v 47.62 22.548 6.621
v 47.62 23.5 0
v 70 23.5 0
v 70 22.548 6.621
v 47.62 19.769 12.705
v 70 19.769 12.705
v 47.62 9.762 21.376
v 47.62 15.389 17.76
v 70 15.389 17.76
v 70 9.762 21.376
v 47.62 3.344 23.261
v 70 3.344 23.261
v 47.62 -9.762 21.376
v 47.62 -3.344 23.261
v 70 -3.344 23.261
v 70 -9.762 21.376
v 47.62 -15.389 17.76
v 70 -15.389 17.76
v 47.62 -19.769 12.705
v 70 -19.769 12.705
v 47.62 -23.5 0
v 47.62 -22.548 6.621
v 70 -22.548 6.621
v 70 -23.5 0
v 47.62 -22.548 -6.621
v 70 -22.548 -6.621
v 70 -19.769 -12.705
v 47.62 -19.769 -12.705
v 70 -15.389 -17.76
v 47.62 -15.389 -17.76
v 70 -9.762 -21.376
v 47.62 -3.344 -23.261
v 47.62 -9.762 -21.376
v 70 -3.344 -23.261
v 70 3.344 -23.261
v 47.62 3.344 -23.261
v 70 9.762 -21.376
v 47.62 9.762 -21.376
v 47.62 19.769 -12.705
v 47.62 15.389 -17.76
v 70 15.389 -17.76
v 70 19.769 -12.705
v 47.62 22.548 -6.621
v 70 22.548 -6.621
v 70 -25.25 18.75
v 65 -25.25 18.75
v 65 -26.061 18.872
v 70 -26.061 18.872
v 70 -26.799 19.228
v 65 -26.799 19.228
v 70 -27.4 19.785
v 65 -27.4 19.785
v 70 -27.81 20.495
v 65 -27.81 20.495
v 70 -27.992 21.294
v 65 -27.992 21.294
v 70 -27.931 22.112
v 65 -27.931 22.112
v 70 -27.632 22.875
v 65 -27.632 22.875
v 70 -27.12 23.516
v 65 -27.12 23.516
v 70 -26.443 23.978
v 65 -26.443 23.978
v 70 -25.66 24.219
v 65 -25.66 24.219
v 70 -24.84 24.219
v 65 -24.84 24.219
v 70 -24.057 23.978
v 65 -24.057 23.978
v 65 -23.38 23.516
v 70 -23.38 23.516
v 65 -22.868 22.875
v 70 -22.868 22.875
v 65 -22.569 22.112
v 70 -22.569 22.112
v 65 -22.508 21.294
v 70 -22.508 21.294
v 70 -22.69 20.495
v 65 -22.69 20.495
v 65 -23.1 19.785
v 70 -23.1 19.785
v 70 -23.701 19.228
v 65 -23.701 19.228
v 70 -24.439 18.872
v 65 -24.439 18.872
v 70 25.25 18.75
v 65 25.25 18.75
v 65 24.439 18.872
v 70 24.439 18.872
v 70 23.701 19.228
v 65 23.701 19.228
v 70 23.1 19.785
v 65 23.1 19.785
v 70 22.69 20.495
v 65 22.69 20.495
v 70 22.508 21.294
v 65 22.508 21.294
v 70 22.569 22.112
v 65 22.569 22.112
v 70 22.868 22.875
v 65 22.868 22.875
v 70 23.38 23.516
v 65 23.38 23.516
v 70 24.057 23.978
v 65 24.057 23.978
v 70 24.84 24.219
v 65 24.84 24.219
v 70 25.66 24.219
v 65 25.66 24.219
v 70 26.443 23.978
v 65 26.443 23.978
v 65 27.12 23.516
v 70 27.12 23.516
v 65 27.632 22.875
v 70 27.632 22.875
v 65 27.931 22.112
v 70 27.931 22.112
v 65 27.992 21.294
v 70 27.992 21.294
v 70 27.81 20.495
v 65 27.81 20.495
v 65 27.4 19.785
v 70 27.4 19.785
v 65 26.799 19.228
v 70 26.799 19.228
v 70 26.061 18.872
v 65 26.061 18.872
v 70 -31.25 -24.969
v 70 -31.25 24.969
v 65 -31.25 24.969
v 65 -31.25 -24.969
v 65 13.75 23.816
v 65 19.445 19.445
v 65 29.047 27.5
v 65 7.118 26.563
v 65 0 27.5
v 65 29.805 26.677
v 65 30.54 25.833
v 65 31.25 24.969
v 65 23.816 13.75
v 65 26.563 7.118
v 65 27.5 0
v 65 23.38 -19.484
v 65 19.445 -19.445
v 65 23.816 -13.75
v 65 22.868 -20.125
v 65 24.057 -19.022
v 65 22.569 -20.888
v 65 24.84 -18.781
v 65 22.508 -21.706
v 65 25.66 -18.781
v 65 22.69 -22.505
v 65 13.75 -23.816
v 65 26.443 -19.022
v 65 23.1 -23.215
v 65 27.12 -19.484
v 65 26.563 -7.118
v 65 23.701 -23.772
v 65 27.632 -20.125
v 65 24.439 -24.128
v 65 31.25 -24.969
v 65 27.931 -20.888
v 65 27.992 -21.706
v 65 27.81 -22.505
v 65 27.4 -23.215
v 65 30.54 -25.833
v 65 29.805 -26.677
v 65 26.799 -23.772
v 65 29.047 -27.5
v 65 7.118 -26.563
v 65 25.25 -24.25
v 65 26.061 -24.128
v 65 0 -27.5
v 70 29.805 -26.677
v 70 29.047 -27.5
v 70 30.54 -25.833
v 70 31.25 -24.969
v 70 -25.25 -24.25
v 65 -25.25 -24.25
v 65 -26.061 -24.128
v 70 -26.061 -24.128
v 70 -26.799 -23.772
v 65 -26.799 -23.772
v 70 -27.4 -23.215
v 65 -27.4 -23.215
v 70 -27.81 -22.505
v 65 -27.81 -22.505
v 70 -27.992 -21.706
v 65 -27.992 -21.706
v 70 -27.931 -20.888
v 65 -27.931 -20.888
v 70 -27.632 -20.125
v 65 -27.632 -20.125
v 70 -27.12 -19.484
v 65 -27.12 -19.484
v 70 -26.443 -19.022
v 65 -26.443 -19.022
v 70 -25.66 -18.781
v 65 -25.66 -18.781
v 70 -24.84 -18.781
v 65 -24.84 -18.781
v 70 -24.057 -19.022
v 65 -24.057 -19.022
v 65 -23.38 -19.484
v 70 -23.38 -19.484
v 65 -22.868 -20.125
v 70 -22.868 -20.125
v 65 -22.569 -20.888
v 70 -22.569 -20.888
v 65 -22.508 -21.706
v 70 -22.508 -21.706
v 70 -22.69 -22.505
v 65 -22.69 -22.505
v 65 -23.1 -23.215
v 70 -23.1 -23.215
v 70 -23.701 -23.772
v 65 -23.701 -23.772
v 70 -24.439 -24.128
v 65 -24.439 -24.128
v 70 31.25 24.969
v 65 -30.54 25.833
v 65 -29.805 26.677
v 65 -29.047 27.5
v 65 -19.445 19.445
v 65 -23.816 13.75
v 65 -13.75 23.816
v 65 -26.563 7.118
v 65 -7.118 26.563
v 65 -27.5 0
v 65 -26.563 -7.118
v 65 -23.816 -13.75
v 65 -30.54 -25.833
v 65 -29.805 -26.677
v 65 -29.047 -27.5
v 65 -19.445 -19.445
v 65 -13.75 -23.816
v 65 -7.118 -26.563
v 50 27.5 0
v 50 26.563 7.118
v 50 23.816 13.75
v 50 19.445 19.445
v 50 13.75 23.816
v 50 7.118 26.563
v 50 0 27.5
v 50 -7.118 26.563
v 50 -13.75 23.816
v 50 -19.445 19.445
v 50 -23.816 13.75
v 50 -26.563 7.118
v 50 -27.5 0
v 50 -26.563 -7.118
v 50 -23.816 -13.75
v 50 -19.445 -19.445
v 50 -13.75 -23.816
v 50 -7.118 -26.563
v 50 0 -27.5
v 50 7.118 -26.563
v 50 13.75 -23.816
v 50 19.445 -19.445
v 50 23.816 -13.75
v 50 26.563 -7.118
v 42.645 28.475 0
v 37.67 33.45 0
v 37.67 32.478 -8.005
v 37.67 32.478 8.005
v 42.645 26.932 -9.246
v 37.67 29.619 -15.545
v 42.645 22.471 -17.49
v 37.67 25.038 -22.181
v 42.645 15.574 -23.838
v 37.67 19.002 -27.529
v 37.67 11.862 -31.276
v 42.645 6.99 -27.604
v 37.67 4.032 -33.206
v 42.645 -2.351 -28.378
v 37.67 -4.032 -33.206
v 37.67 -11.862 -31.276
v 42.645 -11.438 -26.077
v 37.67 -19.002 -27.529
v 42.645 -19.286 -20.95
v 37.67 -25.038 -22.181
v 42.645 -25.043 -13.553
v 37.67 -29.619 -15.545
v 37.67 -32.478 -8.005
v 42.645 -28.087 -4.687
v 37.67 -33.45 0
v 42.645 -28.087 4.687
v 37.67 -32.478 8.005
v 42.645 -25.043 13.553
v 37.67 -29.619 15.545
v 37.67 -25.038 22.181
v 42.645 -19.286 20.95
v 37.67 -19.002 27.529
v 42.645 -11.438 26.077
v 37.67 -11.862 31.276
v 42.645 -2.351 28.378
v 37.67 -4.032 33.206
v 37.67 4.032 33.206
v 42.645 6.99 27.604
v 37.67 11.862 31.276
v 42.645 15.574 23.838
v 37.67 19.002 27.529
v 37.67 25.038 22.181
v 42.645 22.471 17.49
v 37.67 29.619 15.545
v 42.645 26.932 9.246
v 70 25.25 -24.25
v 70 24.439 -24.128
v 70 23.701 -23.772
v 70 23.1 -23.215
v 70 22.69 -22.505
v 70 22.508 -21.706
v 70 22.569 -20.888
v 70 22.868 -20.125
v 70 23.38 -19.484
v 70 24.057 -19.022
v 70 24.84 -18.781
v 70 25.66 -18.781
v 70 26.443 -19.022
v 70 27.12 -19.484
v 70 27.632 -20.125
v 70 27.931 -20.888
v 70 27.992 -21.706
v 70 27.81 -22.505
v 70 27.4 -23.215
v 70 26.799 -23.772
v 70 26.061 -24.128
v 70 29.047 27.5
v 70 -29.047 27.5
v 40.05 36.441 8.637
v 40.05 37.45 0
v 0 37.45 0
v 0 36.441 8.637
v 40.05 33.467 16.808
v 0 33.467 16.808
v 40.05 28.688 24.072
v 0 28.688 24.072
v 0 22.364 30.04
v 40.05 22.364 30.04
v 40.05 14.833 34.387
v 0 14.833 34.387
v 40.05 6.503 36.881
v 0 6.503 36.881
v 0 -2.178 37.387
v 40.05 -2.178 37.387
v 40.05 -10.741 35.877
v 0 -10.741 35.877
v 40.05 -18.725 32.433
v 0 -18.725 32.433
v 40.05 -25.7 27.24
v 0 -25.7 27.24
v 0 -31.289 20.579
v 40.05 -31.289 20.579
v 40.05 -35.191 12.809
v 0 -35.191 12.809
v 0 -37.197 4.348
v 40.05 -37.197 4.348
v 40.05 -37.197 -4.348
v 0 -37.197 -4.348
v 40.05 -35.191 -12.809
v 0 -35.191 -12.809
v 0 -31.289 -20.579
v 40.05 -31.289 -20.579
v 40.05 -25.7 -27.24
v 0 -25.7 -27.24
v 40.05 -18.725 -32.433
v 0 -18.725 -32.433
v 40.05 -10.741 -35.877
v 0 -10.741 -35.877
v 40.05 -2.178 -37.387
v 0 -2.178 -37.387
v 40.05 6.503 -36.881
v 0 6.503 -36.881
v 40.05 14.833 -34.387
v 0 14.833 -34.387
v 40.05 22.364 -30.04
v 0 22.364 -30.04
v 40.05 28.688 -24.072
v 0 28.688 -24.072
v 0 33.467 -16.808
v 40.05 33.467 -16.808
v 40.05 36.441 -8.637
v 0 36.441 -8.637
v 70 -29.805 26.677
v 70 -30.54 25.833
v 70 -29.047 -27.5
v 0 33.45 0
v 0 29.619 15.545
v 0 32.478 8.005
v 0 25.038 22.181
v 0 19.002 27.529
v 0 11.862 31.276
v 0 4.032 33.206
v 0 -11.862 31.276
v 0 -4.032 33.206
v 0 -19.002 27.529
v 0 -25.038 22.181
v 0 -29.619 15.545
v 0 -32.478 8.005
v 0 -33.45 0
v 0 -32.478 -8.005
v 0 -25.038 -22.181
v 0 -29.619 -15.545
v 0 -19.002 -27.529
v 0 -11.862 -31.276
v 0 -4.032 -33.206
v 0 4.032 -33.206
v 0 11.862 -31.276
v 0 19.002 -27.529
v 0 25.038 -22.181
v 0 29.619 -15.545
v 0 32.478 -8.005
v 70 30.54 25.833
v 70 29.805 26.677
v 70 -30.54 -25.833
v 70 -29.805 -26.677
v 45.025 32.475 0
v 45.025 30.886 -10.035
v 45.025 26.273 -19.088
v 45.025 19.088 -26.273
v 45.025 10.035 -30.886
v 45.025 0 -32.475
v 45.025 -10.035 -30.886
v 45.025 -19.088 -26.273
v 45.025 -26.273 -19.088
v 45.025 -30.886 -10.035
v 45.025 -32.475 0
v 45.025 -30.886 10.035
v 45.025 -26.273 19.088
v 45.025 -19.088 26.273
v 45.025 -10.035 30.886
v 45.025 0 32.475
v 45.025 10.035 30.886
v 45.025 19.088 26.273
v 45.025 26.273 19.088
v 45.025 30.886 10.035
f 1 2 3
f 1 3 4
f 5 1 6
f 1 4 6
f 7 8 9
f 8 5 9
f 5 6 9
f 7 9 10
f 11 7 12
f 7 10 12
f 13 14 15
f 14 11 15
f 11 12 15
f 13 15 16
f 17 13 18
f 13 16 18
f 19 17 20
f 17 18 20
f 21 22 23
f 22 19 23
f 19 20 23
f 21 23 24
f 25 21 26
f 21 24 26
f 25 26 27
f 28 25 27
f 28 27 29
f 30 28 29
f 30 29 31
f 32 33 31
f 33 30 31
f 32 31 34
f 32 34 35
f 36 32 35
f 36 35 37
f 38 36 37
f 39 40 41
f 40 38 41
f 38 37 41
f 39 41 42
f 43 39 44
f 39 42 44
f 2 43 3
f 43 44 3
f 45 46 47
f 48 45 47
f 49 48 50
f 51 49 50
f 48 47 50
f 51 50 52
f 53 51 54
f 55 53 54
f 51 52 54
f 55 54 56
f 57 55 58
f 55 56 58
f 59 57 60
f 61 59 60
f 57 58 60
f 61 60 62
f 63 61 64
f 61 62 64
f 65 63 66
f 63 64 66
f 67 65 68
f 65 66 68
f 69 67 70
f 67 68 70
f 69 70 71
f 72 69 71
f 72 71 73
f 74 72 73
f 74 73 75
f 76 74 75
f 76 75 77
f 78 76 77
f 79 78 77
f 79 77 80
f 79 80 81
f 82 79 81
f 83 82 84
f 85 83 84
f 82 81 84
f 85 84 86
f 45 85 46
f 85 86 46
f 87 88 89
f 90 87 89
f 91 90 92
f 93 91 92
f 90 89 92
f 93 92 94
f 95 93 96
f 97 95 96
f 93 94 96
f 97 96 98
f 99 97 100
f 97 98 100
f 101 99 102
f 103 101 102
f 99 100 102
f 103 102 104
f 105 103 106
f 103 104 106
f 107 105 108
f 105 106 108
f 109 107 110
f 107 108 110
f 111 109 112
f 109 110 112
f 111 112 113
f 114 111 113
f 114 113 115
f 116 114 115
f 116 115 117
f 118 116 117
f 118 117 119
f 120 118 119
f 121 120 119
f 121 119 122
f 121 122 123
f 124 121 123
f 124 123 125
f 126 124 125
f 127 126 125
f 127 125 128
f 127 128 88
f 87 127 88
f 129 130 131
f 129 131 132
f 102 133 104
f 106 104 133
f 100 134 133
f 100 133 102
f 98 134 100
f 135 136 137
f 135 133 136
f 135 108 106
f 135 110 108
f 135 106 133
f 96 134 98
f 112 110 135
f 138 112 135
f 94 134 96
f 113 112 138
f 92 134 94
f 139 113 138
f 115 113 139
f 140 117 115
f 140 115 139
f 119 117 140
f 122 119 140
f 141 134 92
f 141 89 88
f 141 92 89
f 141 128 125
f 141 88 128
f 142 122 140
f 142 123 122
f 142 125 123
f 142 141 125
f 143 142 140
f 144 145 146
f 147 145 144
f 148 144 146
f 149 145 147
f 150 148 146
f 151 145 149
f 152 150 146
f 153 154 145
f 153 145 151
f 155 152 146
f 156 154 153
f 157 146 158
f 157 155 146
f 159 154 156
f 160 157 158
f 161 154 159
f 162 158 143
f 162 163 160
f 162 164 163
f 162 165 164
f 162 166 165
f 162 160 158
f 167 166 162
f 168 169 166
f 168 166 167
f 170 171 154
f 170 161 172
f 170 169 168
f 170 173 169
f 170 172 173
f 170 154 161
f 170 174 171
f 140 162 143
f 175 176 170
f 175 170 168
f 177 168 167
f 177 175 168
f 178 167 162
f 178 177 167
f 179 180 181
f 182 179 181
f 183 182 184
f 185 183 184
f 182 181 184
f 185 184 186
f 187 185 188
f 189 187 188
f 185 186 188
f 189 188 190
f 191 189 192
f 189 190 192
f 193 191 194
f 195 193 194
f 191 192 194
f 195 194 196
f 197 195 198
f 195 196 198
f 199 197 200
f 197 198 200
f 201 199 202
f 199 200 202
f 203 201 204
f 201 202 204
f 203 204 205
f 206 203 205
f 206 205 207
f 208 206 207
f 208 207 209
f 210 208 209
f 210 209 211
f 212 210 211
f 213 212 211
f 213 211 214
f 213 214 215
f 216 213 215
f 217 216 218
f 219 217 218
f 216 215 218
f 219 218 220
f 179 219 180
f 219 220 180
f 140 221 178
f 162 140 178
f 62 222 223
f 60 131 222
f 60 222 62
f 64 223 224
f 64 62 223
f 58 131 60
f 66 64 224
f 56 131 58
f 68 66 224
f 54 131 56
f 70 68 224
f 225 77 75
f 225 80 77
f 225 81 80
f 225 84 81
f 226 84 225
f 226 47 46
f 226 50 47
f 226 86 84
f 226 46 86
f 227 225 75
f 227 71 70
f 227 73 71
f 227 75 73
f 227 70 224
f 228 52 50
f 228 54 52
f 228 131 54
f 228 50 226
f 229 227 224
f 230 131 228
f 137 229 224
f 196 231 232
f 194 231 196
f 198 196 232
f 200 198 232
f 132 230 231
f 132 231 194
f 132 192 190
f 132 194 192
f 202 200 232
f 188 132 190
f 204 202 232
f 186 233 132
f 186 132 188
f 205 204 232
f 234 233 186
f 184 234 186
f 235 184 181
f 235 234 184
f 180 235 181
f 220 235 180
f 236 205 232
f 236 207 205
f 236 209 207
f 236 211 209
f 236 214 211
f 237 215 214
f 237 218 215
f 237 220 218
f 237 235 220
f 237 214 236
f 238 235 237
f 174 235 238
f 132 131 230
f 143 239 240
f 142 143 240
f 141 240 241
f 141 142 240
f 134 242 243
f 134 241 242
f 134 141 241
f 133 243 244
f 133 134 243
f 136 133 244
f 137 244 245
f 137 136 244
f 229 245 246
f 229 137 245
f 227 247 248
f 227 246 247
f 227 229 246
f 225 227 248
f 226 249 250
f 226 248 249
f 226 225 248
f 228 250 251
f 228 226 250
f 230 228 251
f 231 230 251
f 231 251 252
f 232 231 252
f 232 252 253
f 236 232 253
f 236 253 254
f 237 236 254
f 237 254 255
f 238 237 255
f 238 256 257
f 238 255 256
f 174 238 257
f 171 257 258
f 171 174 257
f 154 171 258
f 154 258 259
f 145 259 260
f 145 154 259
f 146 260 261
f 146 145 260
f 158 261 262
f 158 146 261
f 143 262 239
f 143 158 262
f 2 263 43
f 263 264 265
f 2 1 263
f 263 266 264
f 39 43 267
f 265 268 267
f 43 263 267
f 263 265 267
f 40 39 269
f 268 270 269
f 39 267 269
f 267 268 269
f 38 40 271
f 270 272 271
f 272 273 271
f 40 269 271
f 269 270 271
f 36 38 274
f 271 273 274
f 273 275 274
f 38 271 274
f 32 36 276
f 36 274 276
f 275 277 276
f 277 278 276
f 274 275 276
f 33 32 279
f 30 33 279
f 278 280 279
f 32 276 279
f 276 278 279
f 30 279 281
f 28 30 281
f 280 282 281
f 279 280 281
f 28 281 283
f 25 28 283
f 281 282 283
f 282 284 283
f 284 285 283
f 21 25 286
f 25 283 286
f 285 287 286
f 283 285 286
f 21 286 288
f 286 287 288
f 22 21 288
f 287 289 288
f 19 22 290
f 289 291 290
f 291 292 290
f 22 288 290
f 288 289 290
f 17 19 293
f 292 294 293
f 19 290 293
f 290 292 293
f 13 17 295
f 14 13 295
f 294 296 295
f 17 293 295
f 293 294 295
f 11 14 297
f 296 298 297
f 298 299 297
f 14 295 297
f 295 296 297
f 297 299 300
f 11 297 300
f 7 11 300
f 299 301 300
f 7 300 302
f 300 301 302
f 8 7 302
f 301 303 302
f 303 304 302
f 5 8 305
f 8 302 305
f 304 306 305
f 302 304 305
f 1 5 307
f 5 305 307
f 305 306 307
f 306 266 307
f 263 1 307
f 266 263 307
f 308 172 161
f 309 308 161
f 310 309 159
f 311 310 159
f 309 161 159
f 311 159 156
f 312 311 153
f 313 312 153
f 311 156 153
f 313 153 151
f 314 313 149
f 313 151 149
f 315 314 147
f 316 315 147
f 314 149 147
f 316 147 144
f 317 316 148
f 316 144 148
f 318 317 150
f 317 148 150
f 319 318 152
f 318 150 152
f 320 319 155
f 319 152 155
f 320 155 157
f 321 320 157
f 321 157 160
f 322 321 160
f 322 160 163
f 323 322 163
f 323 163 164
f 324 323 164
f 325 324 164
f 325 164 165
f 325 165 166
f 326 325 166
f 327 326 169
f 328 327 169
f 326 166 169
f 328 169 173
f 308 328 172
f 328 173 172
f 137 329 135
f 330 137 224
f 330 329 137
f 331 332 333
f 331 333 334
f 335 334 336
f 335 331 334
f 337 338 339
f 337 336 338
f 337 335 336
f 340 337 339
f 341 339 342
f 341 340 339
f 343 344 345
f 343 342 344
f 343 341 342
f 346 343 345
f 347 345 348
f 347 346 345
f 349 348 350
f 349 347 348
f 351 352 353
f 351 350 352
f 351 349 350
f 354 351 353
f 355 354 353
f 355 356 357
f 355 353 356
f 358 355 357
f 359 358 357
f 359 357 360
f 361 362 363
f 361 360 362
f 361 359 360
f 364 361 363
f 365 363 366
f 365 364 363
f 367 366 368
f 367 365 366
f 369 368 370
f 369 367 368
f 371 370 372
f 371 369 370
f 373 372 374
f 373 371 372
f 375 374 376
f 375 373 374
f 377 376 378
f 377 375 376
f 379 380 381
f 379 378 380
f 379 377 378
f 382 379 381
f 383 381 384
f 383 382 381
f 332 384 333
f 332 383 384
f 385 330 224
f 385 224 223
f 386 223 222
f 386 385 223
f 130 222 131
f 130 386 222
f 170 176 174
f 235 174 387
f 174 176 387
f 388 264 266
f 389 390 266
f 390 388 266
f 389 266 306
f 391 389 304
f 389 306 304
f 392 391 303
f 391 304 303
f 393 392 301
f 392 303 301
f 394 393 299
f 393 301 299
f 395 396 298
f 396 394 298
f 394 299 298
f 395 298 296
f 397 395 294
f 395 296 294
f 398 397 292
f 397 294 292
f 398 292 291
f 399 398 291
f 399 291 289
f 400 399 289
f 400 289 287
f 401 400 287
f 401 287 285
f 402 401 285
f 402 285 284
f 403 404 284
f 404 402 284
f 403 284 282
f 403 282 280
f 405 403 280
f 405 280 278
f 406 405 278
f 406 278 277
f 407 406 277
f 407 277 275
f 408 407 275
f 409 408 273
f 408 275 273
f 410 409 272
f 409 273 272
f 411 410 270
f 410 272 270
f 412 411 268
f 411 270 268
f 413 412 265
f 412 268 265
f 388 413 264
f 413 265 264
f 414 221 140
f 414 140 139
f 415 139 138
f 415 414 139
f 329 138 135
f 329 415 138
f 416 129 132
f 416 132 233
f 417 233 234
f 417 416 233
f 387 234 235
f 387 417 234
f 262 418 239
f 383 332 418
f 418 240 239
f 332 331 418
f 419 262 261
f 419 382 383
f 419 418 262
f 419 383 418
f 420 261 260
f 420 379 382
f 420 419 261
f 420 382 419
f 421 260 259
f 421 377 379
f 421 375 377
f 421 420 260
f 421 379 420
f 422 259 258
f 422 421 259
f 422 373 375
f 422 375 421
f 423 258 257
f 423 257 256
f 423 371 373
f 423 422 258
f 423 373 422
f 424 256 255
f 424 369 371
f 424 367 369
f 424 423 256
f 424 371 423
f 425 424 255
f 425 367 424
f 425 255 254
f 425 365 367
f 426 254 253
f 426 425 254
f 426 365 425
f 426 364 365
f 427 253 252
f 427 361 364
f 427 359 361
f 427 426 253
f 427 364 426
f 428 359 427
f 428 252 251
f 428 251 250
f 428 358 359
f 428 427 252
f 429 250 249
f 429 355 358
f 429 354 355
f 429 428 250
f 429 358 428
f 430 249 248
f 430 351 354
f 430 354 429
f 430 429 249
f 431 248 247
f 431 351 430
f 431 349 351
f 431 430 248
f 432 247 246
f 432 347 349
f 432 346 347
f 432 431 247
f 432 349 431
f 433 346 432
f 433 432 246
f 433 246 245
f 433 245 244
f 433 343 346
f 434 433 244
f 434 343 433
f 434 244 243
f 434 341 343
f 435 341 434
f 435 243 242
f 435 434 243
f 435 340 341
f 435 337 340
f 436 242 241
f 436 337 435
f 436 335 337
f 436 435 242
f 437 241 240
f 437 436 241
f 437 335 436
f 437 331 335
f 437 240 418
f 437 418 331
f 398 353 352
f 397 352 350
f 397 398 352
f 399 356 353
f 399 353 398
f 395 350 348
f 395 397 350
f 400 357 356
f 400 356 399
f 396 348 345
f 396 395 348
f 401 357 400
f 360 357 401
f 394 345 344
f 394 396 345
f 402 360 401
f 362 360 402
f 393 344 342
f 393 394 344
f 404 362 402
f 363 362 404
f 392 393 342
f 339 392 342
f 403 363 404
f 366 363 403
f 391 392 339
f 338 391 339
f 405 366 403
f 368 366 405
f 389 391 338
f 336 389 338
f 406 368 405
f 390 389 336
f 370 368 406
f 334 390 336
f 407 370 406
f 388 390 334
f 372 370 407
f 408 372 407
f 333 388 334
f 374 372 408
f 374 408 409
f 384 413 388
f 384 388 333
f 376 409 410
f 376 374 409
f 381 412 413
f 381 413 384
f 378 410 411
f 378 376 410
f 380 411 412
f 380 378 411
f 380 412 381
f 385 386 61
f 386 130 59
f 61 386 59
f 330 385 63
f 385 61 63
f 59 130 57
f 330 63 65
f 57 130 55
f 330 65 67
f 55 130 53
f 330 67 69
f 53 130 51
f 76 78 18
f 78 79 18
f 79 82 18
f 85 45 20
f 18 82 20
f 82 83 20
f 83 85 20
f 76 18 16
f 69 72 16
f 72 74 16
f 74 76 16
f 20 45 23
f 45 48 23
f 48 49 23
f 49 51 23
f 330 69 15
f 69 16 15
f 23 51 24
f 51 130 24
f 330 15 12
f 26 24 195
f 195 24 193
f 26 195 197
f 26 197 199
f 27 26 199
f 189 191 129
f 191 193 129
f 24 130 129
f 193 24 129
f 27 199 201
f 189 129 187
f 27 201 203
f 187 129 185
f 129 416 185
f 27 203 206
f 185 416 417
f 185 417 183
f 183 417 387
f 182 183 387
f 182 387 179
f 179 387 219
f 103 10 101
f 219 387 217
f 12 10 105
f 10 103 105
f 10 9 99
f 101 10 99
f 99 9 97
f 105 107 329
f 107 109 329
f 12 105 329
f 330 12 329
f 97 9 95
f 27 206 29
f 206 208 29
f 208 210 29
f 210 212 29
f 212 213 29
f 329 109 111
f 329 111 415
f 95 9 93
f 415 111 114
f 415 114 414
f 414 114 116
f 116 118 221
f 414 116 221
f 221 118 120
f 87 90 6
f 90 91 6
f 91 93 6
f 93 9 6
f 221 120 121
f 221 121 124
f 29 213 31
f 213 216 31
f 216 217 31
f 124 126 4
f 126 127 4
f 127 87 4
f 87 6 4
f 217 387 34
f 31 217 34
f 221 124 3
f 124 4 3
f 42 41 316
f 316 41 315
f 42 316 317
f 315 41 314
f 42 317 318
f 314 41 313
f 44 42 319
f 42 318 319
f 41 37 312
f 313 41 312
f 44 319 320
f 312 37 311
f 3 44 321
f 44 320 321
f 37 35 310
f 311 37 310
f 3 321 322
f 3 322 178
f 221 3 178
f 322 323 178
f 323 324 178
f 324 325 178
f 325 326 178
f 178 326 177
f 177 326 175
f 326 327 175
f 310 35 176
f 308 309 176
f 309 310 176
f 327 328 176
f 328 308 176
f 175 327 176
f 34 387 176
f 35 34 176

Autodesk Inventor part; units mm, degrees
ref_plane "YZ Plane" through (0, 0, 0) normal (1, 0, 0) x (0, 1, 0)
ref_plane "XZ Plane" through (0, 0, 0) normal (0, 1, 0) x (-1, 0, 0)
ref_plane "XY Plane" through (0, 0, 0) normal (0, 0, 1) x (1, 0, 0)
sketch "Skizze1" plane through (0, 0, 0) normal (0, 0, 1) x (1, 0, 0)
  line L0 (40.05, 37.45) -> (50, 27.5)
  line L1 (50, 27.5) -> (65, 27.5)
  line L2 (65, 27.5) -> (65, 40)
  line L3 (65, 40) -> (70, 40)
  line L4 (70, 40) -> (70, 0)
  line L5 (70, 0) -> (0, 0)
  line L6 (0, 23.5) -> (70, 23.5)
  line L7 (0, 0) -> (0, 37.45)
  line L8 (0, 37.45) -> (40.05, 37.45)
  line L9 (0, 33.45) -> (37.6704, 33.45)
  line L10 (37.6704, 33.45) -> (47.6204, 23.5)
  dimension "d0" = 23.5
  dimension "d2" = 5
  dimension "d3" = 15
  dimension "d6" = 40
  dimension "d7" = 4
  dimension "d34" = 37.45
  dimension "d35" = 135
  dimension "d36" = 70
  dimension "d52" = 4
revolve "Umdrehung2" add sketch "Skizze1" angle 360 about axis through (70, 0, 0) along (-1, 0, 0) contours L0 L1 L2 L3 L4 L6 L10 L9 L7 L8
sketch "Skizze5" plane through (70, 0, 0) normal (1, 0, 0) x (0, 0, -1)
  circle A0 centre (0, 0) radius 40 projected
  line L0 (-27.5, 29.0474) -> (-27.5, -29.0474)
  line L1 (27.5, 29.0474) -> (27.5, -29.0474)
  line L2 (-24.9687, -31.25) -> (24.9687, -31.25)
  line L3 (-24.9687, 31.25) -> (24.9687, 31.25)
  circle A1 centre (0, 0) radius 37.45 projected
  circle A2 centre (0, 0) radius 40
  point P0 (0, 31.25)
  point P1 (-27.5, 0)
  dimension "d38" = 62.5
  dimension "d40" = 55
extrude "Extrusion3" cut sketch "Skizze5" against normal up to surface (5 mm away) contours A0 L1 A1 | L3 A1 A0 | A1 L1 | A0 L2 A1 | L3 A1 | A1 L2 | L0 A1 A0 | L0 A1
sketch "Skizze6" plane through (70, -29.0474, -27.5) normal (1, 0, 0) x (0, 0, -1)
  line L0 (-55, -2.2026) -> (-49, -2.2026)
  line L1 (-49, -2.2026) -> (-49, 3.7974)
  line L2 (-49, 3.7974) -> (-55, 3.7974)
  line L3 (-55, 3.7974) -> (-55, -2.2026)
  line L4 (-55, 60.2974) -> (-49, 60.2974)
  line L5 (-49, 60.2974) -> (-49, 54.2974)
  line L6 (-49, 54.2974) -> (-55, 54.2974)
  line L7 (-55, 54.2974) -> (-55, 60.2974)
  line L8 (0, 60.2974) -> (-6, 60.2974)
  line L9 (-6, 60.2974) -> (-6, 54.2974)
  line L10 (-6, 54.2974) -> (0, 54.2974)
  line L11 (0, 54.2974) -> (0, 60.2974)
  line L12 (0, 3.7974) -> (-6, 3.7974)
  line L13 (-6, 3.7974) -> (-6, -2.2026)
  line L14 (-6, -2.2026) -> (0, -2.2026)
  line L15 (0, -2.2026) -> (0, 3.7974)
  circle A0 centre (-27.5, 29.0474) radius 23.5 projected
  line L16 (0, 0) -> (0, 58.0948) projected
  arc A1 (0, 58.0948) -> (-2.5313, 60.2974) centre (-27.5, 29.0474) ccw projected
  line L17 (-2.5313, 60.2974) -> (-52.4687, 60.2974) projected
  arc A2 (-52.4687, 60.2974) -> (-55, 58.0948) centre (-27.5, 29.0474) ccw projected
  line L18 (-55, 58.0948) -> (-55, 0) projected
  arc A3 (-55, 0) -> (-52.4687, -2.2026) centre (-27.5, 29.0474) ccw projected
  line L19 (-52.4687, -2.2026) -> (-2.5313, -2.2026) projected
  arc A4 (-2.5313, -2.2026) -> (0, 0) centre (-27.5, 29.0474) ccw projected
  line L20 (0, 0) -> (0, 58.0948) projected
  line L21 (-2.5313, 60.2974) -> (-52.4687, 60.2974) projected
  line L22 (-55, 58.0948) -> (-55, 0) projected
  line L23 (-52.4687, -2.2026) -> (-2.5313, -2.2026) projected
  dimension "d43" = 6
hole "Bohrung2" at (70, -25.25, 21.5) at (70, 25.25, 21.5) at (70, 25.25, -21.5) at (70, -25.25, -21.5) direction (-1, 0, 0) diameter 5.5 depth 8 tip angle 118
properties part number "Rohrhalterung_2"
